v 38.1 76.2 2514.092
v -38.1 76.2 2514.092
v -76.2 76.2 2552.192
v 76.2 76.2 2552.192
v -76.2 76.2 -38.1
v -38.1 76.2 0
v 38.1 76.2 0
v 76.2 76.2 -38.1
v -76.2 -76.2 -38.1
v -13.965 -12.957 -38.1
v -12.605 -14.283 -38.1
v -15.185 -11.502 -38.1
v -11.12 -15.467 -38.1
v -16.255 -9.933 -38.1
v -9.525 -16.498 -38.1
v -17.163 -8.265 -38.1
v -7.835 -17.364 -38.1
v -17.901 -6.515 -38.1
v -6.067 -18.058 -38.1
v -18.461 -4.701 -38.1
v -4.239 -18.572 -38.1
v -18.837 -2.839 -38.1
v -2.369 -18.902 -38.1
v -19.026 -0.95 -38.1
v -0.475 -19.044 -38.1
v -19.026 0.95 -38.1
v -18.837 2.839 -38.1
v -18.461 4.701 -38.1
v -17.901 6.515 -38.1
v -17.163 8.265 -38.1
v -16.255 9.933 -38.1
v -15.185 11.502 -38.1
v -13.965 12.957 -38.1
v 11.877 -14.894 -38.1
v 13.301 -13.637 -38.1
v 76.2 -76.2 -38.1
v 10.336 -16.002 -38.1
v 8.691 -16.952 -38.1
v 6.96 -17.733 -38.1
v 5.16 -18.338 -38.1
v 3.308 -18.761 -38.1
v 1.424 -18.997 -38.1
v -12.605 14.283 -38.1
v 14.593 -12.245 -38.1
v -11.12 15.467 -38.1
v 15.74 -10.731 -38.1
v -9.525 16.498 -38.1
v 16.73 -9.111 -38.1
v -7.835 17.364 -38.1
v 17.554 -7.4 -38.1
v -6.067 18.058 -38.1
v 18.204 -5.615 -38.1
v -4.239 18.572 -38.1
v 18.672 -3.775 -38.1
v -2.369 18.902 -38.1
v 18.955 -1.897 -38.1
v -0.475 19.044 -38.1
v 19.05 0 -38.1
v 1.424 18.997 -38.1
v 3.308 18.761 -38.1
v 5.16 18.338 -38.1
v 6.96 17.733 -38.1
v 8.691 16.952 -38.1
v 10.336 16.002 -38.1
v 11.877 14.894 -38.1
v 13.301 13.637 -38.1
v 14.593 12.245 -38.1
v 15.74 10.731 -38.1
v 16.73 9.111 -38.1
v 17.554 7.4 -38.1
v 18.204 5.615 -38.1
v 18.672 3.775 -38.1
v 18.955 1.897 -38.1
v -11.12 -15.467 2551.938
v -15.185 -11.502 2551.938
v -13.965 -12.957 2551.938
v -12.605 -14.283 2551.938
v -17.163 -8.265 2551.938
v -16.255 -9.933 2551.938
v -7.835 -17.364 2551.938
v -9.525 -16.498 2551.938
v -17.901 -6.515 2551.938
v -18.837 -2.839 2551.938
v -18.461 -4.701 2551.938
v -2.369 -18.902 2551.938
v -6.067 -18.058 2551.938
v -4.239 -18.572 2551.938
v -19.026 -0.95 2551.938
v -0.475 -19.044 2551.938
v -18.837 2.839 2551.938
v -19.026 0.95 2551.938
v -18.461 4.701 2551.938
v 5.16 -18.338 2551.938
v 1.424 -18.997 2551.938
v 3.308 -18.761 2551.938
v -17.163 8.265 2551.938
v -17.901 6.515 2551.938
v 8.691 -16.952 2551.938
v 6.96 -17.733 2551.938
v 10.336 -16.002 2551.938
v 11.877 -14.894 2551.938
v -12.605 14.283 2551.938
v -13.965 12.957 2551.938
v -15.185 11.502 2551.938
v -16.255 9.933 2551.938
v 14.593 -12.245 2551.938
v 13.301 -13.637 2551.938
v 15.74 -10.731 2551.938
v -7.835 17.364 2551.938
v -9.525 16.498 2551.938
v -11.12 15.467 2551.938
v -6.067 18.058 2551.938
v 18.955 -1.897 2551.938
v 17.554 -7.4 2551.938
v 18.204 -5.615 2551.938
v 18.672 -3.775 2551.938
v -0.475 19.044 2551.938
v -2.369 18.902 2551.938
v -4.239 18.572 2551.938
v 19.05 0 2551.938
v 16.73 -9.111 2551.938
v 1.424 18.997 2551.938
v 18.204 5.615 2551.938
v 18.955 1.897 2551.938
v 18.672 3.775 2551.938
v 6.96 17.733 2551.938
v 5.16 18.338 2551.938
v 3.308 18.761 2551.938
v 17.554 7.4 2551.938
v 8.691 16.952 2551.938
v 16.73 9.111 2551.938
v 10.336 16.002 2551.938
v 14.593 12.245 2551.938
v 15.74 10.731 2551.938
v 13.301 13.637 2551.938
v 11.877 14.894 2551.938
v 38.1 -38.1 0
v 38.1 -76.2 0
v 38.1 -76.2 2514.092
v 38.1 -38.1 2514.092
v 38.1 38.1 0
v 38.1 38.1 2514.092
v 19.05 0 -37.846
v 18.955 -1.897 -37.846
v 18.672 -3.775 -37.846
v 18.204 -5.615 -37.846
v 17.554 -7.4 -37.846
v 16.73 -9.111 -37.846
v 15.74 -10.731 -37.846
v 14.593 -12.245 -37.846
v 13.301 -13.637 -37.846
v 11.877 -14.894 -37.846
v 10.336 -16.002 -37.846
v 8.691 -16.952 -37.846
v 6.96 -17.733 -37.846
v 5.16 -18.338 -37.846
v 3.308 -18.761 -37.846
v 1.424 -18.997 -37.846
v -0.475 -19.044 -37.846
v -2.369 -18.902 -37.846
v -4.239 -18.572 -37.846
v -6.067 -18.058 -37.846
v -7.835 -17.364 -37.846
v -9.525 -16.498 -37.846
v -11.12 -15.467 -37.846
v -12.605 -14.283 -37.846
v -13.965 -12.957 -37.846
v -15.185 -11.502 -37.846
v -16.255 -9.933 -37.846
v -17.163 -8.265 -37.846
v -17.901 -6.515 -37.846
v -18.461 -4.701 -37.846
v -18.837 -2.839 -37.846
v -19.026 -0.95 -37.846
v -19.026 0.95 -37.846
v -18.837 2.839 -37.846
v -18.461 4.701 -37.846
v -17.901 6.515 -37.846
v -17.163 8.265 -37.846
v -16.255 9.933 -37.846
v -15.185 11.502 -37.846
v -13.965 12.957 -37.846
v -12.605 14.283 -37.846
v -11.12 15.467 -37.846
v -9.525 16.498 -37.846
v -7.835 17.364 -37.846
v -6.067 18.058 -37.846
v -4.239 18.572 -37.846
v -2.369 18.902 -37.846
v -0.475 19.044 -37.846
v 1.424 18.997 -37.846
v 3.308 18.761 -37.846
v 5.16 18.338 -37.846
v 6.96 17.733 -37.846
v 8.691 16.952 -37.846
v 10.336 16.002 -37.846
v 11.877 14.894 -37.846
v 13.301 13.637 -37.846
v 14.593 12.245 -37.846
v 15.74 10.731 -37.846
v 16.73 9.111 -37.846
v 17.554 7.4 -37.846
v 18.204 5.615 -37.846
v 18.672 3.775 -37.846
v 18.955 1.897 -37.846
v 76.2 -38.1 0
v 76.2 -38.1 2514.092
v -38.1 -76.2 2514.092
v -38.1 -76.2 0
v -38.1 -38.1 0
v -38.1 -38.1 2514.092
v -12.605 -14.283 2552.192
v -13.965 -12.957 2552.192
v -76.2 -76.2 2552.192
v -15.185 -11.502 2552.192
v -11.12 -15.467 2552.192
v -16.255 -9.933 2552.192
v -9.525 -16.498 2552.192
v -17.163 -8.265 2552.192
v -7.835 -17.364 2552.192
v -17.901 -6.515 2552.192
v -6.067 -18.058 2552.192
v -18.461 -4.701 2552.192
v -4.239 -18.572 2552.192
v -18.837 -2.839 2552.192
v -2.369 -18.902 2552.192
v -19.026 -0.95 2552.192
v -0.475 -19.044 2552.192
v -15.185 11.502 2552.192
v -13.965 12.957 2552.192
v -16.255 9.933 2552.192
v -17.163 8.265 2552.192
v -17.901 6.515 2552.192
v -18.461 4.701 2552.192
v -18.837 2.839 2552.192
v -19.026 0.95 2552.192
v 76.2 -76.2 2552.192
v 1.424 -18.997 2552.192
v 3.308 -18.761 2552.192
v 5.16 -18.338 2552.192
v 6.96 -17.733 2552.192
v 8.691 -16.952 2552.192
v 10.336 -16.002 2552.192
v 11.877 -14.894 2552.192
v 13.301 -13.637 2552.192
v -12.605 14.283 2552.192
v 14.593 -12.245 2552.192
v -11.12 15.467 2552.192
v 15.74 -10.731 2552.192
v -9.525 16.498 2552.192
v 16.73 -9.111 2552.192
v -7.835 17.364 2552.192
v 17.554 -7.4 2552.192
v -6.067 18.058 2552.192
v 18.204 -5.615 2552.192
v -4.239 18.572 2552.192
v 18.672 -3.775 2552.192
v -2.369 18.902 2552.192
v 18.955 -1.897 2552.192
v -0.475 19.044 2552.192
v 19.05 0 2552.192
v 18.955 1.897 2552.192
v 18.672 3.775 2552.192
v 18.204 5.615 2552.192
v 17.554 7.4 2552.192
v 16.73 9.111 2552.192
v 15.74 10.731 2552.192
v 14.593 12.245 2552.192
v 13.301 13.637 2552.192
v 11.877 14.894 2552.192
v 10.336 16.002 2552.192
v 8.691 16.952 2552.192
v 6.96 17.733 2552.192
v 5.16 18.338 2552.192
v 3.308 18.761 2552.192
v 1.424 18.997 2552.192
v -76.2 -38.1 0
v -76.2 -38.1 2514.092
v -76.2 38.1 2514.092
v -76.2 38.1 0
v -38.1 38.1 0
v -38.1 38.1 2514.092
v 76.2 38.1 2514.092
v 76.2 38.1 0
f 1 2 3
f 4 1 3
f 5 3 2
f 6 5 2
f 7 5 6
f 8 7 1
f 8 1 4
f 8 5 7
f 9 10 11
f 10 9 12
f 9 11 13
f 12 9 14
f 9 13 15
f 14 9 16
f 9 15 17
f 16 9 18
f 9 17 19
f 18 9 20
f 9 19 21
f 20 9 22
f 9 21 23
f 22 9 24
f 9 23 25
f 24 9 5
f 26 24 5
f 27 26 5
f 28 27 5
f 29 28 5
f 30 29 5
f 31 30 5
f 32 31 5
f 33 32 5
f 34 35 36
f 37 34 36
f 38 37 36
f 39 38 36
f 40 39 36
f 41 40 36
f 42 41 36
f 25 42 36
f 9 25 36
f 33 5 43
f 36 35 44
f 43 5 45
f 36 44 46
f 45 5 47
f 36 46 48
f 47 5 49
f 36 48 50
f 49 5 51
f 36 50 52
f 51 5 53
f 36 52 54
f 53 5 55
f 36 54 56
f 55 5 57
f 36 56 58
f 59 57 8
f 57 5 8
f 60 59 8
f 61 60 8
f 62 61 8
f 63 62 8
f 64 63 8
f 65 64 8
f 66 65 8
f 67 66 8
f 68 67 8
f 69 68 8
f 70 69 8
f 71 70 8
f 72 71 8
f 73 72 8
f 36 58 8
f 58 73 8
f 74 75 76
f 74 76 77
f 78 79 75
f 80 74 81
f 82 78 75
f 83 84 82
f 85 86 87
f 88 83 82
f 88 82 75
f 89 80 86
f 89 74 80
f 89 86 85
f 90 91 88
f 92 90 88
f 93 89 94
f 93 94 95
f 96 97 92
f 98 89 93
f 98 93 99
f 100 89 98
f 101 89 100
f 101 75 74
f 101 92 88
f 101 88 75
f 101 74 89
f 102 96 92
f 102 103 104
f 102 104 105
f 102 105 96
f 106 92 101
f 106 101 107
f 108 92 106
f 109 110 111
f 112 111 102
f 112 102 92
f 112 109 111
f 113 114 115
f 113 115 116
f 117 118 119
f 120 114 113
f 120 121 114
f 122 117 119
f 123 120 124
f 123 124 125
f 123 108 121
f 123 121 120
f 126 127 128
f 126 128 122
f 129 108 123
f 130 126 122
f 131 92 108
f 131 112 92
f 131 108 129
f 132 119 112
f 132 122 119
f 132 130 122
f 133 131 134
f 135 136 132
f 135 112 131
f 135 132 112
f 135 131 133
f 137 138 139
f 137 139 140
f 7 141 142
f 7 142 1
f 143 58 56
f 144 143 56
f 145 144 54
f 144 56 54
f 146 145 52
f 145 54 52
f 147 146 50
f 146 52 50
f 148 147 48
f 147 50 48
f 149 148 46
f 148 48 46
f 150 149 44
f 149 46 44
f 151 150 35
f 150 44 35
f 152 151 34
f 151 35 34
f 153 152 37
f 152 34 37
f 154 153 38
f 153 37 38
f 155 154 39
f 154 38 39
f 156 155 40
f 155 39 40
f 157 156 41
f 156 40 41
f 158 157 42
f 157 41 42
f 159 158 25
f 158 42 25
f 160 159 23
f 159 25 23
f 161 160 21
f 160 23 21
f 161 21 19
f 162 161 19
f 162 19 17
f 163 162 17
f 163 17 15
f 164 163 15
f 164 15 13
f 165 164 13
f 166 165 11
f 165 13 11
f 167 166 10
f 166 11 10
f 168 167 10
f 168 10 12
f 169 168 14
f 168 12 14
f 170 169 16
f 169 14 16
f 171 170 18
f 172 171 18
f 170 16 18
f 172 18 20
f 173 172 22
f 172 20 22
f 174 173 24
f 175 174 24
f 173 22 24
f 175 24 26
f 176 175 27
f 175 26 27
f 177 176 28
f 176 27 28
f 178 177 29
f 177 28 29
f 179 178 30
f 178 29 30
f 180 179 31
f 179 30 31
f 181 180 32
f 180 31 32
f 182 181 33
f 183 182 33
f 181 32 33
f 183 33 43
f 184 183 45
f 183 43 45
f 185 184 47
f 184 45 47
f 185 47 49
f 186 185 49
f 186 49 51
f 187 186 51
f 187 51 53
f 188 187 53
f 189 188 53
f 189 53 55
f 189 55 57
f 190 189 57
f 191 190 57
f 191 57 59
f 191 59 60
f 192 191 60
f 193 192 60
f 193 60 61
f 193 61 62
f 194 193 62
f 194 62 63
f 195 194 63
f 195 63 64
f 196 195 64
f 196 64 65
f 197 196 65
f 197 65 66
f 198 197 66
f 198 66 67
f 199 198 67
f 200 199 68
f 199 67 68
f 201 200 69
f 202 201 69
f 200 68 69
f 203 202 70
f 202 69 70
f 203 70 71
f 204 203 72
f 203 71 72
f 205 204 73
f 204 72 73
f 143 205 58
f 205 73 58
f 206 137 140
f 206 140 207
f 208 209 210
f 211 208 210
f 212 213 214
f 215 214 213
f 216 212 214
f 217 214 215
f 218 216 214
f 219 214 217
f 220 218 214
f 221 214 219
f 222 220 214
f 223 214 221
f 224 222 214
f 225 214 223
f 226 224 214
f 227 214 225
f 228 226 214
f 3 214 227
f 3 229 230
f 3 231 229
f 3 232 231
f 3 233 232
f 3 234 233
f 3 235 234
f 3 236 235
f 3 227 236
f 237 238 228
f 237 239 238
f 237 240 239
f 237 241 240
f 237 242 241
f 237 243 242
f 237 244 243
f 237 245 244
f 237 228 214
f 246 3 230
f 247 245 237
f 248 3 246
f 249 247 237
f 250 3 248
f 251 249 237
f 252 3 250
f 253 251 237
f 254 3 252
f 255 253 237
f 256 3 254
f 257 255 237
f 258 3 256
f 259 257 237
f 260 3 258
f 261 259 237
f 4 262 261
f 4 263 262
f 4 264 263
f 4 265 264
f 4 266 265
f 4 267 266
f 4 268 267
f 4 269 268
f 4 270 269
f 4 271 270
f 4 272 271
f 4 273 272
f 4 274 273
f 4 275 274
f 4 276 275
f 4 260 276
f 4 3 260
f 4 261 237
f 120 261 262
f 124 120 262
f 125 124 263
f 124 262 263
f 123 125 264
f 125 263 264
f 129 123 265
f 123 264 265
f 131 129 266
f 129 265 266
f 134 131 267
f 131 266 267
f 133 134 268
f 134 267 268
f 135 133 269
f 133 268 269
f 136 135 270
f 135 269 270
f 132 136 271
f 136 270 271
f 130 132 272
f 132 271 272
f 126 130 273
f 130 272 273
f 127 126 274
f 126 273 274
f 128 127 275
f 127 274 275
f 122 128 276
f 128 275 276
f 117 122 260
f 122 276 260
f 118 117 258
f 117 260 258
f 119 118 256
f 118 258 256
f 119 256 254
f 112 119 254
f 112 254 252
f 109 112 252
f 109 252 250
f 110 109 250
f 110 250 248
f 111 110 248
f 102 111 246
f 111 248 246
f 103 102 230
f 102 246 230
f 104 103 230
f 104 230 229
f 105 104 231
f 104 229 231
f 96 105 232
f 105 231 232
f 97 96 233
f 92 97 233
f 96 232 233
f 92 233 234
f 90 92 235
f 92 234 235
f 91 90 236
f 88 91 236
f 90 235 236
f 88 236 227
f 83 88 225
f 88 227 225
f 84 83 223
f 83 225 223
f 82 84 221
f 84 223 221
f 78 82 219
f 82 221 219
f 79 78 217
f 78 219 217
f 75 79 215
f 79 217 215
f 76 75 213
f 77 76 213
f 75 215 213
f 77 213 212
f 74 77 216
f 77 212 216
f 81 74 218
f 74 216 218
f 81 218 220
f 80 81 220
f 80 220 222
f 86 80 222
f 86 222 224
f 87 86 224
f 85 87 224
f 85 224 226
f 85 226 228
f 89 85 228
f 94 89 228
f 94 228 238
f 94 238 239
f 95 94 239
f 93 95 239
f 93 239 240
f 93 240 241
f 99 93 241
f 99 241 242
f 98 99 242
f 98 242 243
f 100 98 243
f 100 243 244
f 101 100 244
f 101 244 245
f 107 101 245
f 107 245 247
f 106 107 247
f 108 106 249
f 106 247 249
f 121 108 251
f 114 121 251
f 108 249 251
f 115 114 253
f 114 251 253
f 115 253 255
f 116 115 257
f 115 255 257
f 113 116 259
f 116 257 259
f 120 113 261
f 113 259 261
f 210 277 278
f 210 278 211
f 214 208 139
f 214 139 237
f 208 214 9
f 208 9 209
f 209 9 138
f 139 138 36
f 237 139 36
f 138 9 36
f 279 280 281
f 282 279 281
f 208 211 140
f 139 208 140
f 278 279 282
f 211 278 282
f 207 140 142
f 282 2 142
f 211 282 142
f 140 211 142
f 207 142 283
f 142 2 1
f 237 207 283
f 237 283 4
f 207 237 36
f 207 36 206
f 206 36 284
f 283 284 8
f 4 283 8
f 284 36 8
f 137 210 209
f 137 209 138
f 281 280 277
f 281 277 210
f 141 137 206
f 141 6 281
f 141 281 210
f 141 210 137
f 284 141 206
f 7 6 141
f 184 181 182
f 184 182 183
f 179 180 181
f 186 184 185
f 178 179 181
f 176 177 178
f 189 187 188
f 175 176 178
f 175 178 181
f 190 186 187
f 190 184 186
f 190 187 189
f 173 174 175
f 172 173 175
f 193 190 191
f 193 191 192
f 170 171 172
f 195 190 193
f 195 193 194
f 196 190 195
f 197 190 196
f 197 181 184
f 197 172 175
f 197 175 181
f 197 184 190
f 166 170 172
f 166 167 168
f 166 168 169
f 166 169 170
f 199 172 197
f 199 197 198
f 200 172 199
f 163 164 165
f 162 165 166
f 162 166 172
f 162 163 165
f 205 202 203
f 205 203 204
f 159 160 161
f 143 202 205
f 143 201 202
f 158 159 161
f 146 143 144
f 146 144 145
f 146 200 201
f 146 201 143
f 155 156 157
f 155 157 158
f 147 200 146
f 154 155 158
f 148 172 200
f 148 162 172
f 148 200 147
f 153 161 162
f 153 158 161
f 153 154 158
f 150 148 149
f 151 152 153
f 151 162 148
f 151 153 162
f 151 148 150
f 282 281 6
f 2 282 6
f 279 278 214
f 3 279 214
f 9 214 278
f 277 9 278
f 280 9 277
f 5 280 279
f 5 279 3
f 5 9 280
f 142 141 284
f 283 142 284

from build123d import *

# Parameters (mm, degrees)
F0_W     = 152.4
F0_H     = 152.4
F1_DEPTH = 38.1
F2_W     = 38.1
F2_H     = 38.1
F3_DEPTH = 2514.092
F4_W     = 152.4
F4_H     = 152.4
F5_DEPTH = 38.1
F6_R     = 19.05
F7_DEPTH = 0.254
F8_R     = 19.05
F9_DEPTH = 0.254


with BuildPart() as f1:
    # F0 (on Top) → F1 (new body)
    with BuildSketch(Plane.XY):
        Rectangle(F0_W, F0_H)
    extrude(amount=-F1_DEPTH)

    # F2 (on face) → F3 (join)
    with BuildSketch(Plane.XY):
        with Locations((57.15, -57.15)):
            Rectangle(F2_W, F2_H)
        with Locations((57.15, 57.15)):
            Rectangle(F2_W, F2_H)
        with Locations((-57.15, -57.15)):
            Rectangle(F2_W, F2_H)
        with Locations((-57.15, 57.15)):
            Rectangle(F2_W, F2_H)
    extrude(amount=F3_DEPTH)

    # F4 (on face) → F5 (join)
    with BuildSketch(Plane.XY.offset(2514.092)):
        Rectangle(F4_W, F4_H)
    extrude(amount=F5_DEPTH)

    # F6 (on face) → F7 (cut)
    with BuildSketch(Plane(origin=(0, 0, -38.1), x_dir=(1, 0, 0), z_dir=(0, 0, -1))):
        Circle(F6_R)
    extrude(amount=-F7_DEPTH, mode=Mode.SUBTRACT)

    # F8 (on face) → F9 (cut)
    with BuildSketch(Plane.XY.offset(2552.192)):
        Circle(F8_R)
    extrude(amount=-F9_DEPTH, mode=Mode.SUBTRACT)


solid = f1.part
